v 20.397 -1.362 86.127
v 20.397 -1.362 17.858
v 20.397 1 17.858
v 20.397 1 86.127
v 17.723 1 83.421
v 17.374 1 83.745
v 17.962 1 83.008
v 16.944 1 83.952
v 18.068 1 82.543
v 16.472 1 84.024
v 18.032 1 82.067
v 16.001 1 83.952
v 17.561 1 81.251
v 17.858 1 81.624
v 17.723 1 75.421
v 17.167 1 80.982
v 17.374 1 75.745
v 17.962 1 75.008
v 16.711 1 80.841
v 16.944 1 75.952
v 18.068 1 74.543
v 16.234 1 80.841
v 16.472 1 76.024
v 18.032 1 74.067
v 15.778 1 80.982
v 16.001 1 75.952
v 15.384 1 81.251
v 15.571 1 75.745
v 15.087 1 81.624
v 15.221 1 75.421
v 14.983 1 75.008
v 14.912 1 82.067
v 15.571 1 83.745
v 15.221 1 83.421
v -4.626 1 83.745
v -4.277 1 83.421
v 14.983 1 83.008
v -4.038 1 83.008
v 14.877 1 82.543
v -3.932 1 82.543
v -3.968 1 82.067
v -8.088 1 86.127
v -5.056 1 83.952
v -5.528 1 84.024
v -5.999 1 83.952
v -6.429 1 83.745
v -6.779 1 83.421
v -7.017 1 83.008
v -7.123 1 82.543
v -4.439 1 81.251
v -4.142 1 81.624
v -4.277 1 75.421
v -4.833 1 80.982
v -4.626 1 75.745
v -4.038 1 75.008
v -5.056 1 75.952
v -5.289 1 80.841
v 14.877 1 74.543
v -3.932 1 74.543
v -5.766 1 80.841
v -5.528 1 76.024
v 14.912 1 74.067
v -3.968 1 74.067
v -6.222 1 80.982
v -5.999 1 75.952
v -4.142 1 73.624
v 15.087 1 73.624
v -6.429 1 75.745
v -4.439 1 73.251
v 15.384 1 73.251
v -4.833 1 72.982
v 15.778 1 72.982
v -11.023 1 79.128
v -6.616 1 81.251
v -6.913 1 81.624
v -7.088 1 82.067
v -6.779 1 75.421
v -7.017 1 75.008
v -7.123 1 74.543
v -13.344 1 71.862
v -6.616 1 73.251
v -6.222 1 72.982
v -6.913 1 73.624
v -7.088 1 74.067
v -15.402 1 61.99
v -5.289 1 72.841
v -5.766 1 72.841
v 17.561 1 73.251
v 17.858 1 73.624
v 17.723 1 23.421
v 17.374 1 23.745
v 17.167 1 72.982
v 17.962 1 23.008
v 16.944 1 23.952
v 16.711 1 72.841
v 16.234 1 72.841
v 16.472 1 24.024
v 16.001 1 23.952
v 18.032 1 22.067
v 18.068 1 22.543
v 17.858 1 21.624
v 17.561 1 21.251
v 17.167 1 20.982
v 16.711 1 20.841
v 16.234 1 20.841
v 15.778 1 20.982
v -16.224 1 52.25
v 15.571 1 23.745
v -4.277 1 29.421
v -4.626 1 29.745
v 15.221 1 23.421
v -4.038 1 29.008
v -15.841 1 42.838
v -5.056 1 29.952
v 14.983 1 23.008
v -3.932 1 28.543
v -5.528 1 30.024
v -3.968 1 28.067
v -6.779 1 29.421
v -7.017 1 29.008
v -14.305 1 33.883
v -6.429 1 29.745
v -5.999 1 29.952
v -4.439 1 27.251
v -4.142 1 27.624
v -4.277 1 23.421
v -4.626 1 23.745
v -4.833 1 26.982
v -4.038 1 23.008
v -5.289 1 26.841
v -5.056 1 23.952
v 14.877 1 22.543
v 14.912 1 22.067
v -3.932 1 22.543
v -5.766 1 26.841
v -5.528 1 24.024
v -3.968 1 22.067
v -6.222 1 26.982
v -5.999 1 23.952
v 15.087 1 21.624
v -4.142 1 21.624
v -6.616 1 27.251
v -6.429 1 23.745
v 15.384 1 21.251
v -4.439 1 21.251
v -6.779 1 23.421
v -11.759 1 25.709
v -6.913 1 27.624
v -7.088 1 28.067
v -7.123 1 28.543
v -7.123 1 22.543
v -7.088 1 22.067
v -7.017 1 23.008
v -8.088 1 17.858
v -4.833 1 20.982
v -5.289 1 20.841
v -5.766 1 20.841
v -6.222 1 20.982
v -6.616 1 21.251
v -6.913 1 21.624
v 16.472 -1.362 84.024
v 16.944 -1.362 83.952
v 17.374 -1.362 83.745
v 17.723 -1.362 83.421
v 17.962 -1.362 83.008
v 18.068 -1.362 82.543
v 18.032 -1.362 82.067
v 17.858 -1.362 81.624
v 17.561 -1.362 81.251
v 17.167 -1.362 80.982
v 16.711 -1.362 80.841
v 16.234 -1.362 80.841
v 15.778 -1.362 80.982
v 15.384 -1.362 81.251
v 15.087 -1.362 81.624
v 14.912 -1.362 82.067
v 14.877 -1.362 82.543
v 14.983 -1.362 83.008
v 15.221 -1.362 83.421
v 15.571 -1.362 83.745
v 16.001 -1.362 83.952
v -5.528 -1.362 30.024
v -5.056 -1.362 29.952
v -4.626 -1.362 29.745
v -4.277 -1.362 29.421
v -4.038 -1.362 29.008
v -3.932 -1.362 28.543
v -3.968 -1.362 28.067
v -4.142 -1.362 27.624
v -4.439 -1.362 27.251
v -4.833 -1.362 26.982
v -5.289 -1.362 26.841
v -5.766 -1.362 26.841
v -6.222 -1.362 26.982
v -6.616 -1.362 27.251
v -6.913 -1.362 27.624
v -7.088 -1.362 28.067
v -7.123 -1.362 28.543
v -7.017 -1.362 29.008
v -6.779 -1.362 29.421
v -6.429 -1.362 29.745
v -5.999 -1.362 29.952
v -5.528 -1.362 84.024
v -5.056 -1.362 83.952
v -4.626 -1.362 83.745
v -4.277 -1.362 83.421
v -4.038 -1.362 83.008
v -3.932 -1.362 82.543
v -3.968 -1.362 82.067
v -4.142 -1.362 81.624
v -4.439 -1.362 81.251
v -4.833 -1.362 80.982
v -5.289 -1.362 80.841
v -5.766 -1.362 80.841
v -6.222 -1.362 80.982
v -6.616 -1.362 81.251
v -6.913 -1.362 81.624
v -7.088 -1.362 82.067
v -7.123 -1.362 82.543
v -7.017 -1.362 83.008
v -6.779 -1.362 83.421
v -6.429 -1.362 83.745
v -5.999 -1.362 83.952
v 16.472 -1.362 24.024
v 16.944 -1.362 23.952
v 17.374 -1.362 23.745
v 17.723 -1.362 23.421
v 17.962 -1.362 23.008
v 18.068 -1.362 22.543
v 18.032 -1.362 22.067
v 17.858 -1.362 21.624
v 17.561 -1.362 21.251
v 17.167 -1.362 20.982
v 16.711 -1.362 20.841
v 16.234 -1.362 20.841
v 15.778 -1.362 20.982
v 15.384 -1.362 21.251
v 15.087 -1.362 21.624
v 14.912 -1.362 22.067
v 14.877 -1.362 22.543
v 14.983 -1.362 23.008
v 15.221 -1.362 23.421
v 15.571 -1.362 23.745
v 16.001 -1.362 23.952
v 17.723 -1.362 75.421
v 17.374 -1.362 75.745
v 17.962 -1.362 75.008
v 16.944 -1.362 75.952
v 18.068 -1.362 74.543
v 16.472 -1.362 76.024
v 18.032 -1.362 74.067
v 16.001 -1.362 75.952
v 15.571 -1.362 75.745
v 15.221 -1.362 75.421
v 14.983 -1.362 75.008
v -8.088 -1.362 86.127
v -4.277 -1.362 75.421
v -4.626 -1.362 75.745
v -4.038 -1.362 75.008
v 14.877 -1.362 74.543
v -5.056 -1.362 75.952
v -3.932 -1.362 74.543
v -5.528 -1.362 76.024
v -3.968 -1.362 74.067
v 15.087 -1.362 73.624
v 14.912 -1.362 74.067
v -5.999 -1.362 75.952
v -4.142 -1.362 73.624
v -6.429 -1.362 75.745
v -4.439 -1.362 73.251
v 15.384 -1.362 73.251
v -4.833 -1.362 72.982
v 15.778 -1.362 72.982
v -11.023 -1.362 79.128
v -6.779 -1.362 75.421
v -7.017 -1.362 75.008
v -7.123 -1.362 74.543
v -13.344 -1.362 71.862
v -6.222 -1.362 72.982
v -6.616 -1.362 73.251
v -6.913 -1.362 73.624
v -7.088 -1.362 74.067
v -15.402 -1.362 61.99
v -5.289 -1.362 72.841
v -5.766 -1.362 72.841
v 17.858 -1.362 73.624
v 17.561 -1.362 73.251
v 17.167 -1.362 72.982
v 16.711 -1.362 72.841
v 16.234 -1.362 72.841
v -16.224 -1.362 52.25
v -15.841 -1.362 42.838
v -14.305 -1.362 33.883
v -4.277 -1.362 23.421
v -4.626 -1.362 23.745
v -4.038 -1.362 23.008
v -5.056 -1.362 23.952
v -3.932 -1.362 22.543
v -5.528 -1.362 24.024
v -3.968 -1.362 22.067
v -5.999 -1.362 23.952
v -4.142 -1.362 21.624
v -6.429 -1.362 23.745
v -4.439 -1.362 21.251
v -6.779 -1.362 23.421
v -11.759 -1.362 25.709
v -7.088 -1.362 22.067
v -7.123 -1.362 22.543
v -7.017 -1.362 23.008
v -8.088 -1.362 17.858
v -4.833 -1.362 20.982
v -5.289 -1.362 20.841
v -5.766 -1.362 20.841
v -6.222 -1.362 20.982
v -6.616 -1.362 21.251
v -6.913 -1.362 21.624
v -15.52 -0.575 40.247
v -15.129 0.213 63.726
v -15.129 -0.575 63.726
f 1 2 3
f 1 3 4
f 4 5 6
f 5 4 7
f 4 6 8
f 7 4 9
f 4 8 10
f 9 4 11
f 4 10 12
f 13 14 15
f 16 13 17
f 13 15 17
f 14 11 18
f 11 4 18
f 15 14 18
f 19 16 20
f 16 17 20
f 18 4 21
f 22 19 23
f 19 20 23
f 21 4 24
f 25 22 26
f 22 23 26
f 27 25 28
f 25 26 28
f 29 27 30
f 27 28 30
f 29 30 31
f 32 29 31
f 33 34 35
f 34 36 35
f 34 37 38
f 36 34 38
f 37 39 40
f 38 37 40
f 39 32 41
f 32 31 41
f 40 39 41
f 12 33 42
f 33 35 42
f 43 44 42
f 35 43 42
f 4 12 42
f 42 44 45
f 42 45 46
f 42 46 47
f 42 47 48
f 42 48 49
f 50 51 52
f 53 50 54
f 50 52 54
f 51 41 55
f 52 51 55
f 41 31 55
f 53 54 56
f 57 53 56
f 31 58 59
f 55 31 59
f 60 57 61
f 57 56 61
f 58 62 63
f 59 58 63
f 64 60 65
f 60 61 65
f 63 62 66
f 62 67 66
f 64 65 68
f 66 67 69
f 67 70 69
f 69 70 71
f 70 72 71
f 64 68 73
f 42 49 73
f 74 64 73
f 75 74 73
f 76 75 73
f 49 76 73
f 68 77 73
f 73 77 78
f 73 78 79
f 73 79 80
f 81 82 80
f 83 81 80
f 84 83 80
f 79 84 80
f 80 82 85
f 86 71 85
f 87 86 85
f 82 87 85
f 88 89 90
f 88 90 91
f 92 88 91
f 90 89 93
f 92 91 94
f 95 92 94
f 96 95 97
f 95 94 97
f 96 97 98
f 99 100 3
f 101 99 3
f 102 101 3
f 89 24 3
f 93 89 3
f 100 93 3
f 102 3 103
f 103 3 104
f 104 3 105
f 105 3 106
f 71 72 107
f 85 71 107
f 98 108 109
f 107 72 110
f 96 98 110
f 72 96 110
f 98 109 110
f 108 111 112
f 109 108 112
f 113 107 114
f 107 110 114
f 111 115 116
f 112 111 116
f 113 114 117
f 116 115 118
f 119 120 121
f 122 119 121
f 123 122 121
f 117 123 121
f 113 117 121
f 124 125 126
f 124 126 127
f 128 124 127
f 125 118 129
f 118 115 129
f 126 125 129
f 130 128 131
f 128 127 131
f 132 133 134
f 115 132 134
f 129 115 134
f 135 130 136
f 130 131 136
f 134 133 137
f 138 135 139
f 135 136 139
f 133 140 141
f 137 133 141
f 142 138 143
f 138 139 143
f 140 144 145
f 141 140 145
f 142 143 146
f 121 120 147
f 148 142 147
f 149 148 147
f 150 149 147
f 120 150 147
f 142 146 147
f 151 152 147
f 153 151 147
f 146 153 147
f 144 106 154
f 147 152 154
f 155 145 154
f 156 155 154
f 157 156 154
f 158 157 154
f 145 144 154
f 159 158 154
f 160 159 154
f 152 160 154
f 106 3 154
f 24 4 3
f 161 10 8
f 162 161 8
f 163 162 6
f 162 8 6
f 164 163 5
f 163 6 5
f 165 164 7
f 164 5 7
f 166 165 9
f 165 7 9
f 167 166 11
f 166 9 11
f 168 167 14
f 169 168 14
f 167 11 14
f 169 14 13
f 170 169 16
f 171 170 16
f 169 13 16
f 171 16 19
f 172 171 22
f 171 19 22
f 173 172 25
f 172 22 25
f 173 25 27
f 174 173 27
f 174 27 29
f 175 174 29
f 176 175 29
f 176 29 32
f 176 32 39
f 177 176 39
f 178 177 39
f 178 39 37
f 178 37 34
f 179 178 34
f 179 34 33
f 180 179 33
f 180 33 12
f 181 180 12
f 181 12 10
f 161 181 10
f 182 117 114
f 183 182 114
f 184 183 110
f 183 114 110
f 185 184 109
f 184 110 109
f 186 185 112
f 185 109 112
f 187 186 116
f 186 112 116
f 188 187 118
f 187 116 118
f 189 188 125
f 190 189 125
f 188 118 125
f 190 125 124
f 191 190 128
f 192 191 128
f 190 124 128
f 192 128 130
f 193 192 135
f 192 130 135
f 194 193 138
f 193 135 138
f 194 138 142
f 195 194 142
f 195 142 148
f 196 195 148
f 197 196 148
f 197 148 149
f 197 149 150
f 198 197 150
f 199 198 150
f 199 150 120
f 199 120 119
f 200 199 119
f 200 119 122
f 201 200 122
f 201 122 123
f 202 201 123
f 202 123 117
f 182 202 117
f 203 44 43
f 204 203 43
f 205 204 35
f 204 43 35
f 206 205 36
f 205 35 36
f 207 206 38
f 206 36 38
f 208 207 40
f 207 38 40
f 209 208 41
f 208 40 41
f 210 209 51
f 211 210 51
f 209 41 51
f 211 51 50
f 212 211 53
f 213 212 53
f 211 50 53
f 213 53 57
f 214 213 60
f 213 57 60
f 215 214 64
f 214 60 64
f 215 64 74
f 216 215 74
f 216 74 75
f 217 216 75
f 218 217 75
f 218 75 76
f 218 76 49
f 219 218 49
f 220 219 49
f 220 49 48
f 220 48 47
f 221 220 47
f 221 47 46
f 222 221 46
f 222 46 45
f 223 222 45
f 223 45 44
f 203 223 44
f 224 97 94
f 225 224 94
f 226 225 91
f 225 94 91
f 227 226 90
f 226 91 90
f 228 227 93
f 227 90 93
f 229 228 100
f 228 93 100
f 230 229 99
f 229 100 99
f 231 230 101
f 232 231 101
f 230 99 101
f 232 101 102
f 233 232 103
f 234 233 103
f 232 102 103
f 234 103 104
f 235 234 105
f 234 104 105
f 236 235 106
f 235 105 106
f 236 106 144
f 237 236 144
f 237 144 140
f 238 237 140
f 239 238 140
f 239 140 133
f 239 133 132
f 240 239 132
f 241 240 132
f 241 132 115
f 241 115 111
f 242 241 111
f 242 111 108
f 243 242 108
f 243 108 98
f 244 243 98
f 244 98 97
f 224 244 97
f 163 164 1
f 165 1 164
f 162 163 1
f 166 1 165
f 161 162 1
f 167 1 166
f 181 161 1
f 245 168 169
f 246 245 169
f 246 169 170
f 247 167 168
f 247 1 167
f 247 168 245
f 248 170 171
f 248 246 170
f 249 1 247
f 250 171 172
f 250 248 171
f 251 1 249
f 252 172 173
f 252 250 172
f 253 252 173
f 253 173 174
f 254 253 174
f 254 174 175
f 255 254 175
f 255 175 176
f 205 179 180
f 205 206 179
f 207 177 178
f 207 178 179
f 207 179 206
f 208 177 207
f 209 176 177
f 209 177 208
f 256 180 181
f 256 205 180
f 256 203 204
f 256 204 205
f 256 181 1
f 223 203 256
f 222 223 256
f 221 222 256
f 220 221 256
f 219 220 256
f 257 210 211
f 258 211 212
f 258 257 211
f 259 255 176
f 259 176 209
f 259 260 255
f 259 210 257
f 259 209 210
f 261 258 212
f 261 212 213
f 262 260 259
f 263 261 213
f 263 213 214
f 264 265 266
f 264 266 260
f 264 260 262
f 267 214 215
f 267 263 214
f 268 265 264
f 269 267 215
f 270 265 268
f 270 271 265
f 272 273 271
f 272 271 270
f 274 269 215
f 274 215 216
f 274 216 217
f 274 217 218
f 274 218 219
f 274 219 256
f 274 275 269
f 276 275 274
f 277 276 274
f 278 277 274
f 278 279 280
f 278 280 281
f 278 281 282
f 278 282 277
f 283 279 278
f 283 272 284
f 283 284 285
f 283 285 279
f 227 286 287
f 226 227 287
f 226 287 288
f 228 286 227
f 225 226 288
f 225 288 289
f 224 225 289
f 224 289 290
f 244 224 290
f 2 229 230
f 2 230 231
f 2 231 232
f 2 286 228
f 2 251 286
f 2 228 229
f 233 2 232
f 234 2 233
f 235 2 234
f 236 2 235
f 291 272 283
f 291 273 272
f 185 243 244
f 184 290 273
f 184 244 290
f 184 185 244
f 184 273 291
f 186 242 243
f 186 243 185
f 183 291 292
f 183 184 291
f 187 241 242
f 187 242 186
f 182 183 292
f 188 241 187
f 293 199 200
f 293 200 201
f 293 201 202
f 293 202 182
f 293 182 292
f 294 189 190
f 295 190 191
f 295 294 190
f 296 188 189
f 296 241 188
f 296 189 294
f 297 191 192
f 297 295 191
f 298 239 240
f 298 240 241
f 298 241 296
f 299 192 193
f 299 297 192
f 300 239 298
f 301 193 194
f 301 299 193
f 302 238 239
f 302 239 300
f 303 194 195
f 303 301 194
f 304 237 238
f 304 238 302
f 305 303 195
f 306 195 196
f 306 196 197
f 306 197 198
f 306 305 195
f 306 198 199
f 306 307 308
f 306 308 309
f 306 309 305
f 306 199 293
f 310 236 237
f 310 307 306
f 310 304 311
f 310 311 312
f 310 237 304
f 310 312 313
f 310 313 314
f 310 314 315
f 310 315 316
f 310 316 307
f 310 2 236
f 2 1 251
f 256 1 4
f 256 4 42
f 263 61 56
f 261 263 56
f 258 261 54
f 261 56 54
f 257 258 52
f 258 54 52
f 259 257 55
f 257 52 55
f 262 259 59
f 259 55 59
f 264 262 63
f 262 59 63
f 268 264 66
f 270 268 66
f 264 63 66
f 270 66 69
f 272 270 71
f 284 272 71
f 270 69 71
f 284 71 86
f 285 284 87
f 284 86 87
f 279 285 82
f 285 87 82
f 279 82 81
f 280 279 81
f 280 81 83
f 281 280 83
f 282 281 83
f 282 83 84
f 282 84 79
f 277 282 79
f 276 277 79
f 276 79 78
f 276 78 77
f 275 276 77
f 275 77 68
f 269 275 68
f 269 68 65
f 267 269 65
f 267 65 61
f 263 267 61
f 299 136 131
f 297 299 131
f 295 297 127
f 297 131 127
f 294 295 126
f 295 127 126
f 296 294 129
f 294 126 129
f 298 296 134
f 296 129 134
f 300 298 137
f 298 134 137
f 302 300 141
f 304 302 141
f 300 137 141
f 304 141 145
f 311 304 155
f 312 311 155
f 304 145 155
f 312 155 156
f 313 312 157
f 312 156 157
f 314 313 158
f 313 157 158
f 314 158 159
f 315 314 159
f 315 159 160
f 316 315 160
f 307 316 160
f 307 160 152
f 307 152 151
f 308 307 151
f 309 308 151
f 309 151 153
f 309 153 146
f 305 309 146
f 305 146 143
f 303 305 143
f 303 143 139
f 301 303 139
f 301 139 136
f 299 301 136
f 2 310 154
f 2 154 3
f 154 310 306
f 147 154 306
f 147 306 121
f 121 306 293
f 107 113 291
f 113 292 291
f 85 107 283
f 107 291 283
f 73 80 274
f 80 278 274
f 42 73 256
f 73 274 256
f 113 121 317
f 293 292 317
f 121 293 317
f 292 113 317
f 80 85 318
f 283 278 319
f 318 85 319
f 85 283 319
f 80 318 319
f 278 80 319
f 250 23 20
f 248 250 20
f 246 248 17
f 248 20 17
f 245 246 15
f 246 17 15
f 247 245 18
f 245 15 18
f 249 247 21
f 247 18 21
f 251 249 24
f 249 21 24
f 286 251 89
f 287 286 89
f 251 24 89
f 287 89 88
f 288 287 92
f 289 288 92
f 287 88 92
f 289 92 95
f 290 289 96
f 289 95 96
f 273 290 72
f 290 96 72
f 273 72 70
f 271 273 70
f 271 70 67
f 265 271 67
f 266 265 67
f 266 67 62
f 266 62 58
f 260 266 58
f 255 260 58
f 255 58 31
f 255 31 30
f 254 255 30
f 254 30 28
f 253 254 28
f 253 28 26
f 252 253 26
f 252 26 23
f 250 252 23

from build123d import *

# Parameters (mm, degrees)
BOSS_EXTRUDE1_DEPTH      = 1
BOSS_EXTRUDE1_DEPTH_BACK = 1.3622
SKETCH15_R               = 1.6
CUT_EXTRUDE1_DEPTH       = 10


with BuildPart() as part:
    # Sketch1 → Boss-Extrude1 (new, two sides: drawn at the far end of the back side and taken through both)
    with BuildSketch(Plane(origin=(0, 0, 0), x_dir=(1, 0, 0), z_dir=(0, 1, 0)).offset(-BOSS_EXTRUDE1_DEPTH_BACK)):
        with BuildLine():
            Line((-8.087993737, -17.857854423), (20.396582526, -17.857854423))
            Line((20.396582526, -17.857854423), (20.396582526, -86.127406927))
            Line((20.396582526, -86.127406927), (-8.087993737, -86.127406927))
            add(Edge.make_bspline(
                [(-8.087993737, -17.857854423), (-19.823523703, -38.981015745), (-18.062835517, -64.98565312), (-8.087993737, -86.127406927)],
                knots=[0, 0, 0, 0, 1, 1, 1, 1], degree=3))
        make_face()
    extrude(amount=BOSS_EXTRUDE1_DEPTH + BOSS_EXTRUDE1_DEPTH_BACK)

    # Sketch15 → Cut-Extrude1 (cut)
    with BuildSketch(Plane(origin=(0, 1, 0), x_dir=(1, 0, 0), z_dir=(0, 1, 0))):
        with Locations(Location((-5.527632766, -22.423505535, 0), (0, 0, 270))):
            Circle(SKETCH15_R)
        with Locations(Location((16.472367234, -22.423505535, 0), (0, 0, 270))):
            Circle(SKETCH15_R)
        with Locations(Location((-5.527632766, -82.423505535, 0), (0, 0, 270))):
            Circle(SKETCH15_R)
        with Locations(Location((16.472367234, -82.423505535, 0), (0, 0, 270))):
            Circle(SKETCH15_R)
        with Locations(Location((-5.527632766, -74.423505535, 0), (0, 0, 270))):
            Circle(SKETCH15_R)
        with Locations(Location((16.472367234, -74.423505535, 0), (0, 0, 270))):
            Circle(SKETCH15_R)
        with Locations(Location((-5.527632766, -28.423505535, 0), (0, 0, 270))):
            Circle(SKETCH15_R)
    extrude(amount=-CUT_EXTRUDE1_DEPTH, mode=Mode.SUBTRACT)


solid = part.part
